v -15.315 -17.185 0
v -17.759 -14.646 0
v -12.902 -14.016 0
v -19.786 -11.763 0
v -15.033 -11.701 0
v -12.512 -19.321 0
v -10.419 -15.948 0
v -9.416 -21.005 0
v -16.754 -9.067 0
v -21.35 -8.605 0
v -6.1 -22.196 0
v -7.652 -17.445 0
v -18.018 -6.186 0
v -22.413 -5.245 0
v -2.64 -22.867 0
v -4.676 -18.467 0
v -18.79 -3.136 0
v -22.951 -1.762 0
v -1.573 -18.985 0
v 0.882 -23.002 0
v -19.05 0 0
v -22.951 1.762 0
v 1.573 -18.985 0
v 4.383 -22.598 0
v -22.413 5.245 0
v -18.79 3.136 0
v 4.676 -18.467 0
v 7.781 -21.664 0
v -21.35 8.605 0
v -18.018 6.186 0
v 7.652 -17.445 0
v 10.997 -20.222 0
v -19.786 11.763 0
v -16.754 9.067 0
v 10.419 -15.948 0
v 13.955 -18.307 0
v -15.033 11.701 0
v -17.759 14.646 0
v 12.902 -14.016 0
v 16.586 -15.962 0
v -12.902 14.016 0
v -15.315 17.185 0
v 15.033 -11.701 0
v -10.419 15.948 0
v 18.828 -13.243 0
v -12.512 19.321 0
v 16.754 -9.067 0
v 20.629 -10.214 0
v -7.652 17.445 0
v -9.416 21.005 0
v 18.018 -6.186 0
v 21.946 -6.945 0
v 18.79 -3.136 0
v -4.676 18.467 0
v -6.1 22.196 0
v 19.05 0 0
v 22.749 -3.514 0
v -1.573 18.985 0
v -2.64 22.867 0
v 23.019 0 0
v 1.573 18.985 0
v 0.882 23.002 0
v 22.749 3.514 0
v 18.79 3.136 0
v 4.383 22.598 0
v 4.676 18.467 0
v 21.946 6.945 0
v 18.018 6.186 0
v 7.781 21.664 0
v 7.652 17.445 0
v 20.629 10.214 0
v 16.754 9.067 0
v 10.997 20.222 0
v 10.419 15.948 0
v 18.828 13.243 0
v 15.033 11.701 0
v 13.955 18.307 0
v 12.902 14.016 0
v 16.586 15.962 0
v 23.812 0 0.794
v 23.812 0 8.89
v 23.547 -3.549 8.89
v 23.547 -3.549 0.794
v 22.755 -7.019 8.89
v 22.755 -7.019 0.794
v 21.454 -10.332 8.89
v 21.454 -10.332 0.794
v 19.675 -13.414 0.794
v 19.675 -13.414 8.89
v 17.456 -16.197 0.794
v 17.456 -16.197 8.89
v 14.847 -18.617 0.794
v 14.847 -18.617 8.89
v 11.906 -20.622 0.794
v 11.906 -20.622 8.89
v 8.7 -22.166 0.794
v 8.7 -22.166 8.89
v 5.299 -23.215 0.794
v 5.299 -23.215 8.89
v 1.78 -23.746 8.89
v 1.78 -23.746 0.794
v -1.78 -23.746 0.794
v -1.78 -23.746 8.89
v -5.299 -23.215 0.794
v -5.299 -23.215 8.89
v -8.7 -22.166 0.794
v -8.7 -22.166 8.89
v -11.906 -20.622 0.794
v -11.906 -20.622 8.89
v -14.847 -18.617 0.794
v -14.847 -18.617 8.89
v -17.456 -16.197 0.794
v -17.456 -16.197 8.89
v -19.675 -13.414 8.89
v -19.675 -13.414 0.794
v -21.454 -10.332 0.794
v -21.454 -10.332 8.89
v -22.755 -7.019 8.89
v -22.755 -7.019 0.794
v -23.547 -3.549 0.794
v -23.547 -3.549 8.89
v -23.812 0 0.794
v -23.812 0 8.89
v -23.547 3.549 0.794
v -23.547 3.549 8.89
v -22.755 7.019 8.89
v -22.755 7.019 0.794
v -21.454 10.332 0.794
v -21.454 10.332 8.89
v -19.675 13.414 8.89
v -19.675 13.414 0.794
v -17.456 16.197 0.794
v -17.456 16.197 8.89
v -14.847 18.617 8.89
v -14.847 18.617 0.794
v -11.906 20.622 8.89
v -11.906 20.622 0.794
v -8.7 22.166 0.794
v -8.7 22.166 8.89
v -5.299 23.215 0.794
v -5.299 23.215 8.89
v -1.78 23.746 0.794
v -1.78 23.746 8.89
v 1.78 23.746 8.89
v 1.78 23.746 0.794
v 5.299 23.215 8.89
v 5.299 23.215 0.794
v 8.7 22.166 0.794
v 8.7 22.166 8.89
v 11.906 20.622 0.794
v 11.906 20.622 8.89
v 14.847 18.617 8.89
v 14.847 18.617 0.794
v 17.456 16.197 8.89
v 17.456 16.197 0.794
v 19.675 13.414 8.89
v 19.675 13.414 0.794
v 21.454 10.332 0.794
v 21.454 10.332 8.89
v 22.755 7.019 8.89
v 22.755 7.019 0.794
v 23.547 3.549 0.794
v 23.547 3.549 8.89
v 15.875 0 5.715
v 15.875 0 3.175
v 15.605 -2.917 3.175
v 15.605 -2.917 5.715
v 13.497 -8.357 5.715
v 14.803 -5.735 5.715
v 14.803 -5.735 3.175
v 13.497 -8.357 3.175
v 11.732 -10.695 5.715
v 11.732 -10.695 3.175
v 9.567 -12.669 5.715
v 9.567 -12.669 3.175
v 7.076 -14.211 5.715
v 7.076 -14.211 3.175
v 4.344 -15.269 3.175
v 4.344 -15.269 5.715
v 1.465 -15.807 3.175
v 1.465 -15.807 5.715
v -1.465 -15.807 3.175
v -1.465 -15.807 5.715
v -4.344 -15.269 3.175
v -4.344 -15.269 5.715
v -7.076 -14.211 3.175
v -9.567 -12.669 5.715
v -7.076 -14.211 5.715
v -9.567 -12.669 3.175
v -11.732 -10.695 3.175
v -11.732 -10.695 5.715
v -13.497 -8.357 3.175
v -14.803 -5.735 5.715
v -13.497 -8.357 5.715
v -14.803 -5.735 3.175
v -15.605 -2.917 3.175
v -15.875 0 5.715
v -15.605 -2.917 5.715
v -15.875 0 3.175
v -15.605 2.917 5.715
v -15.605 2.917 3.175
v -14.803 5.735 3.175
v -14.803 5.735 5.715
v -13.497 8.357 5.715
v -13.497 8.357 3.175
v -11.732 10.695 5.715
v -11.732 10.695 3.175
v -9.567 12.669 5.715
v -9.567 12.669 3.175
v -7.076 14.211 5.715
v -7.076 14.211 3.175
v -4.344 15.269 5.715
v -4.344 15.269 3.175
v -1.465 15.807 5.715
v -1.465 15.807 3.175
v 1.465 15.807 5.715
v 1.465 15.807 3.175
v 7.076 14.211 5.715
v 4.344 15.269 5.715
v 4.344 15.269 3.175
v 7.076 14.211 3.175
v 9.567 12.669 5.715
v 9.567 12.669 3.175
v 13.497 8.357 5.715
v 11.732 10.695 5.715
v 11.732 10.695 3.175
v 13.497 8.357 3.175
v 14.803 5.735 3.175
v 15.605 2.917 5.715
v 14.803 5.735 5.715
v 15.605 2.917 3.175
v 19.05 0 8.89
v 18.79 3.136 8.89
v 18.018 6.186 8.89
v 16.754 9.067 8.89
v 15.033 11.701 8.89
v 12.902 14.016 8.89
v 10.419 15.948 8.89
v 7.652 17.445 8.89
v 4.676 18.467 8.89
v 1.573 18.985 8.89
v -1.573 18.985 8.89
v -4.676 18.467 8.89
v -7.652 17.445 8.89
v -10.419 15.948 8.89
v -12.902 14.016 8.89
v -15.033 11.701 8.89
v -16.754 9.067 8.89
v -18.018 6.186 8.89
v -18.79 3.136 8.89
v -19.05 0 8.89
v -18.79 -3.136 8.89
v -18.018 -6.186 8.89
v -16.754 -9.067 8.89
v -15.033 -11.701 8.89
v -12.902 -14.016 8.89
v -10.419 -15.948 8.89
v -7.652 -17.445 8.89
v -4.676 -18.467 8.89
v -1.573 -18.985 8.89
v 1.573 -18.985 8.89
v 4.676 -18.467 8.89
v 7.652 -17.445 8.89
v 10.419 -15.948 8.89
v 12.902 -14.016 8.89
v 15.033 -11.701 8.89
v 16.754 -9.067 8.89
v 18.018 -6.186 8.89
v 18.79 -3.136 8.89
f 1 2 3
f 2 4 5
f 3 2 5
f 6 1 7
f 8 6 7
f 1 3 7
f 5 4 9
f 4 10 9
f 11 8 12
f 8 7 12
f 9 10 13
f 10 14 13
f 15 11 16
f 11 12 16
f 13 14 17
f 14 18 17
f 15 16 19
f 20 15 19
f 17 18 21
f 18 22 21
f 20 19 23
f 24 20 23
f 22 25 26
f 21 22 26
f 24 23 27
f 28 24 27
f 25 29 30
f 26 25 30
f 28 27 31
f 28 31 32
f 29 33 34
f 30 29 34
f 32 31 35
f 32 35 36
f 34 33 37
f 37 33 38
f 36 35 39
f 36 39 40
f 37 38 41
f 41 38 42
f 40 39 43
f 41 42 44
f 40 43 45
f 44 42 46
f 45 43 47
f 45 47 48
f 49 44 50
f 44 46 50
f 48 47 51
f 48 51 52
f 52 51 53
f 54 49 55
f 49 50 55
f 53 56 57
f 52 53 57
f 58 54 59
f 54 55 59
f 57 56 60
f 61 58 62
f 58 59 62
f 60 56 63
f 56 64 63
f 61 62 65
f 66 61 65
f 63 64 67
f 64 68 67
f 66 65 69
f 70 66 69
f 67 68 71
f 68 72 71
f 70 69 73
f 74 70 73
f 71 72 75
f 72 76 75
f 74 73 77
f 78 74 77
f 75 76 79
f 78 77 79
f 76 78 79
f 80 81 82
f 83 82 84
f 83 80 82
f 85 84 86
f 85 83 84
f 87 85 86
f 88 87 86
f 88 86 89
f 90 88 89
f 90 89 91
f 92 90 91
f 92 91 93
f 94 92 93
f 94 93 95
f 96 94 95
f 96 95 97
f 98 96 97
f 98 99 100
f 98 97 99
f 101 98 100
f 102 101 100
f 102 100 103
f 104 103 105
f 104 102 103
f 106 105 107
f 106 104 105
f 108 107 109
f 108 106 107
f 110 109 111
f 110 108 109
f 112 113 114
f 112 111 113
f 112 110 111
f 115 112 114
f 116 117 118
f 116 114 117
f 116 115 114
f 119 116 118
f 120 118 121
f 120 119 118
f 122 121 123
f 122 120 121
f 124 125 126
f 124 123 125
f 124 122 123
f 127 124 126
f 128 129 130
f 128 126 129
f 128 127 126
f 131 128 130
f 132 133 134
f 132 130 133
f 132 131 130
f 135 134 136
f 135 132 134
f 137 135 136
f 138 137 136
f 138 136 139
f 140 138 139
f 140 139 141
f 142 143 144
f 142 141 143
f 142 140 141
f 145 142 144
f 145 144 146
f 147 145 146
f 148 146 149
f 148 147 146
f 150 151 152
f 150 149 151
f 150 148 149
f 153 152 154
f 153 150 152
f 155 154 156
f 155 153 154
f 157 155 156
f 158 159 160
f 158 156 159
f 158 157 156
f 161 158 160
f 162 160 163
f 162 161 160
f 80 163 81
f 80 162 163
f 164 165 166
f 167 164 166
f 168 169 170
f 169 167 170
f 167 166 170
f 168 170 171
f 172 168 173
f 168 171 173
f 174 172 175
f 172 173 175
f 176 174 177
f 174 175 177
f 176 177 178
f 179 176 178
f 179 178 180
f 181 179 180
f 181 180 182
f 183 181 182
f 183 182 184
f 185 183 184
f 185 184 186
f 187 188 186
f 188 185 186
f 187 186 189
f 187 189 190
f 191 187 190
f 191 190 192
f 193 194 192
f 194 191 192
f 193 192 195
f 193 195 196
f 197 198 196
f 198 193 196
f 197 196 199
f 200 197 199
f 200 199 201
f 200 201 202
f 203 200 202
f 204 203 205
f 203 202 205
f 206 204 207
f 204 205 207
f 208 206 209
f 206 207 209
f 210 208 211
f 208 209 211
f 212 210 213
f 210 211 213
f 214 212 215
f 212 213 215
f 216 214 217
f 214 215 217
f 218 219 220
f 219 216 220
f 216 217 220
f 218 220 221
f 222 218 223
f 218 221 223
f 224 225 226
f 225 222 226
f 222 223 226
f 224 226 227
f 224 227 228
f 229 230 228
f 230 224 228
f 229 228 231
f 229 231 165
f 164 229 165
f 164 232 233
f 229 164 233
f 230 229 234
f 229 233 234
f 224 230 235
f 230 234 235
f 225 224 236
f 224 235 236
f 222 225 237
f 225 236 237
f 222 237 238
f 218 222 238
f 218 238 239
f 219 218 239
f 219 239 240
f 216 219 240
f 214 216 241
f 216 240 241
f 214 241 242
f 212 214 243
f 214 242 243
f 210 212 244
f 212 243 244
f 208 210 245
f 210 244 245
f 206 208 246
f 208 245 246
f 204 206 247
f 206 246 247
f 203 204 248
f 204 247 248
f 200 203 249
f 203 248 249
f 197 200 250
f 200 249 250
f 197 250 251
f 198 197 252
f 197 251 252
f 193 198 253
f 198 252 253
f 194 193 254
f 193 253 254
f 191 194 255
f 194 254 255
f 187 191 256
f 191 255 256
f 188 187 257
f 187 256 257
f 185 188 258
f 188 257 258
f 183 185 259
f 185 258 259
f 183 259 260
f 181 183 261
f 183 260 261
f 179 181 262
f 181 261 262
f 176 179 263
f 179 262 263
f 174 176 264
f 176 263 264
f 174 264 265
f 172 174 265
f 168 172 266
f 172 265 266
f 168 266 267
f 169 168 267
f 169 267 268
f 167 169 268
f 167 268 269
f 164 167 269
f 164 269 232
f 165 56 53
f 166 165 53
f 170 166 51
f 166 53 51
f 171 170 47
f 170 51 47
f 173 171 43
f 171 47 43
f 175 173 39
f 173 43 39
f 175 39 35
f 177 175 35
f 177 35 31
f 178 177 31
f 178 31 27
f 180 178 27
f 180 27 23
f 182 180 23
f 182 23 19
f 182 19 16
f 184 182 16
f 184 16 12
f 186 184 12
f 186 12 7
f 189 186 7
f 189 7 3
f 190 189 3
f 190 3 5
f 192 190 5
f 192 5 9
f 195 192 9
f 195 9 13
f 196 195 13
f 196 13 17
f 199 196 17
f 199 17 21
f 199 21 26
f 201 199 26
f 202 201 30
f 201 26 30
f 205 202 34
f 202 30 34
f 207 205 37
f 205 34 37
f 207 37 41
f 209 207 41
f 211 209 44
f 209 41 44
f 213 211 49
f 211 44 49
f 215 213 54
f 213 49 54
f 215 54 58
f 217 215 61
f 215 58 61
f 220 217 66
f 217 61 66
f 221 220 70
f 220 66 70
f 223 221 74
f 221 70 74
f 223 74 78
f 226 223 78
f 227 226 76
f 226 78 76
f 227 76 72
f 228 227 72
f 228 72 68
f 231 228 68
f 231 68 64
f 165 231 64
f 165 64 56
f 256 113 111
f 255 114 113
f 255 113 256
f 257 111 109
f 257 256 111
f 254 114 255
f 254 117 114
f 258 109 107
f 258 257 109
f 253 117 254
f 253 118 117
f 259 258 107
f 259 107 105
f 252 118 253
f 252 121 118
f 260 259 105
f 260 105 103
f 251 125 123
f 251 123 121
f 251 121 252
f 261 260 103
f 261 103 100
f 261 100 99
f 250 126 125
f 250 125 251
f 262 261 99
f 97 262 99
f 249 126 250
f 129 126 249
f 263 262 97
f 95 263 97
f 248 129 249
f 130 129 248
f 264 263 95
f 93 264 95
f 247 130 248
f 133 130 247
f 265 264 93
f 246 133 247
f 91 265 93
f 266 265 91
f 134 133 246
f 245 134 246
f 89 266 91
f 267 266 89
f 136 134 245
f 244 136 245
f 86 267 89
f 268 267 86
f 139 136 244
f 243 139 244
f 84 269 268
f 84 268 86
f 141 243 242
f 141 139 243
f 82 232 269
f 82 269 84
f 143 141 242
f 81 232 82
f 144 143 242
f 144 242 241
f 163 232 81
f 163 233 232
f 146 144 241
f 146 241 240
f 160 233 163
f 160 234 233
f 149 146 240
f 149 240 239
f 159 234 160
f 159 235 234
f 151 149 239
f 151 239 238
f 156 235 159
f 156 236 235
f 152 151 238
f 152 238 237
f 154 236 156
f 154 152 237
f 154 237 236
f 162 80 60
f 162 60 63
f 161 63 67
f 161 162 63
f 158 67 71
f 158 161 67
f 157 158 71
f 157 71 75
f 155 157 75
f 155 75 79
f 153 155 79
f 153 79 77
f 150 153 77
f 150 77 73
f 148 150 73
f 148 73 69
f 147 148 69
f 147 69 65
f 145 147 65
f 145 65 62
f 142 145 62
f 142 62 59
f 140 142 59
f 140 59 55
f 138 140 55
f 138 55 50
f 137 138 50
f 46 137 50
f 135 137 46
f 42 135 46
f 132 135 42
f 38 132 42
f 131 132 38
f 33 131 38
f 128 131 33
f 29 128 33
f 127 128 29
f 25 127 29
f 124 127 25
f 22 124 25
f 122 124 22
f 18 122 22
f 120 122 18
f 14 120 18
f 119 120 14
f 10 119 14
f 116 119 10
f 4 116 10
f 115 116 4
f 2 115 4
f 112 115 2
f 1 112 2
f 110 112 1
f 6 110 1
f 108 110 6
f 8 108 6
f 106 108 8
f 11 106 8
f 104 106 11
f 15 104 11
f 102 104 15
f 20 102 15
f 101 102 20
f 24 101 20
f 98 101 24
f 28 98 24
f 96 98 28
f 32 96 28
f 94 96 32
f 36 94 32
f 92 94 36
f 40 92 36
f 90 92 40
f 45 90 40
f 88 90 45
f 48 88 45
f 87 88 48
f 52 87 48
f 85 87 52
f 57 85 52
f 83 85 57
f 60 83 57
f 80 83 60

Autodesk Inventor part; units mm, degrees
ref_plane "YZ Plane" through (0, 0, 0) normal (1, 0, 0) x (0, 1, 0)
ref_plane "XZ Plane" through (0, 0, 0) normal (0, 1, 0) x (-1, 0, 0)
ref_plane "XY Plane" through (0, 0, 0) normal (0, 0, 1) x (1, 0, 0)
sketch "Sketch1" plane through (0, 0, 0) normal (0, 0, 1) x (1, 0, 0)
  circle A0 centre (0, 0) radius 15.875
  circle A1 centre (0, 0) radius 23.8125
  dimension "d0" = 31.75
  dimension "d1" = 47.625
extrude "Extrusion1" add sketch "Sketch1" along normal blind 8.89
chamfer "Chamfer1" distance 0.7937 angle 45 1 edges at (-23.8125, 0, 0)
chamfer "Chamfer2" distance 3.175 angle 45 2 edges at (-15.875, 0, 8.89) (-15.875, 0, 0)
properties part number "Tire" material "Rubber, Silicone"
